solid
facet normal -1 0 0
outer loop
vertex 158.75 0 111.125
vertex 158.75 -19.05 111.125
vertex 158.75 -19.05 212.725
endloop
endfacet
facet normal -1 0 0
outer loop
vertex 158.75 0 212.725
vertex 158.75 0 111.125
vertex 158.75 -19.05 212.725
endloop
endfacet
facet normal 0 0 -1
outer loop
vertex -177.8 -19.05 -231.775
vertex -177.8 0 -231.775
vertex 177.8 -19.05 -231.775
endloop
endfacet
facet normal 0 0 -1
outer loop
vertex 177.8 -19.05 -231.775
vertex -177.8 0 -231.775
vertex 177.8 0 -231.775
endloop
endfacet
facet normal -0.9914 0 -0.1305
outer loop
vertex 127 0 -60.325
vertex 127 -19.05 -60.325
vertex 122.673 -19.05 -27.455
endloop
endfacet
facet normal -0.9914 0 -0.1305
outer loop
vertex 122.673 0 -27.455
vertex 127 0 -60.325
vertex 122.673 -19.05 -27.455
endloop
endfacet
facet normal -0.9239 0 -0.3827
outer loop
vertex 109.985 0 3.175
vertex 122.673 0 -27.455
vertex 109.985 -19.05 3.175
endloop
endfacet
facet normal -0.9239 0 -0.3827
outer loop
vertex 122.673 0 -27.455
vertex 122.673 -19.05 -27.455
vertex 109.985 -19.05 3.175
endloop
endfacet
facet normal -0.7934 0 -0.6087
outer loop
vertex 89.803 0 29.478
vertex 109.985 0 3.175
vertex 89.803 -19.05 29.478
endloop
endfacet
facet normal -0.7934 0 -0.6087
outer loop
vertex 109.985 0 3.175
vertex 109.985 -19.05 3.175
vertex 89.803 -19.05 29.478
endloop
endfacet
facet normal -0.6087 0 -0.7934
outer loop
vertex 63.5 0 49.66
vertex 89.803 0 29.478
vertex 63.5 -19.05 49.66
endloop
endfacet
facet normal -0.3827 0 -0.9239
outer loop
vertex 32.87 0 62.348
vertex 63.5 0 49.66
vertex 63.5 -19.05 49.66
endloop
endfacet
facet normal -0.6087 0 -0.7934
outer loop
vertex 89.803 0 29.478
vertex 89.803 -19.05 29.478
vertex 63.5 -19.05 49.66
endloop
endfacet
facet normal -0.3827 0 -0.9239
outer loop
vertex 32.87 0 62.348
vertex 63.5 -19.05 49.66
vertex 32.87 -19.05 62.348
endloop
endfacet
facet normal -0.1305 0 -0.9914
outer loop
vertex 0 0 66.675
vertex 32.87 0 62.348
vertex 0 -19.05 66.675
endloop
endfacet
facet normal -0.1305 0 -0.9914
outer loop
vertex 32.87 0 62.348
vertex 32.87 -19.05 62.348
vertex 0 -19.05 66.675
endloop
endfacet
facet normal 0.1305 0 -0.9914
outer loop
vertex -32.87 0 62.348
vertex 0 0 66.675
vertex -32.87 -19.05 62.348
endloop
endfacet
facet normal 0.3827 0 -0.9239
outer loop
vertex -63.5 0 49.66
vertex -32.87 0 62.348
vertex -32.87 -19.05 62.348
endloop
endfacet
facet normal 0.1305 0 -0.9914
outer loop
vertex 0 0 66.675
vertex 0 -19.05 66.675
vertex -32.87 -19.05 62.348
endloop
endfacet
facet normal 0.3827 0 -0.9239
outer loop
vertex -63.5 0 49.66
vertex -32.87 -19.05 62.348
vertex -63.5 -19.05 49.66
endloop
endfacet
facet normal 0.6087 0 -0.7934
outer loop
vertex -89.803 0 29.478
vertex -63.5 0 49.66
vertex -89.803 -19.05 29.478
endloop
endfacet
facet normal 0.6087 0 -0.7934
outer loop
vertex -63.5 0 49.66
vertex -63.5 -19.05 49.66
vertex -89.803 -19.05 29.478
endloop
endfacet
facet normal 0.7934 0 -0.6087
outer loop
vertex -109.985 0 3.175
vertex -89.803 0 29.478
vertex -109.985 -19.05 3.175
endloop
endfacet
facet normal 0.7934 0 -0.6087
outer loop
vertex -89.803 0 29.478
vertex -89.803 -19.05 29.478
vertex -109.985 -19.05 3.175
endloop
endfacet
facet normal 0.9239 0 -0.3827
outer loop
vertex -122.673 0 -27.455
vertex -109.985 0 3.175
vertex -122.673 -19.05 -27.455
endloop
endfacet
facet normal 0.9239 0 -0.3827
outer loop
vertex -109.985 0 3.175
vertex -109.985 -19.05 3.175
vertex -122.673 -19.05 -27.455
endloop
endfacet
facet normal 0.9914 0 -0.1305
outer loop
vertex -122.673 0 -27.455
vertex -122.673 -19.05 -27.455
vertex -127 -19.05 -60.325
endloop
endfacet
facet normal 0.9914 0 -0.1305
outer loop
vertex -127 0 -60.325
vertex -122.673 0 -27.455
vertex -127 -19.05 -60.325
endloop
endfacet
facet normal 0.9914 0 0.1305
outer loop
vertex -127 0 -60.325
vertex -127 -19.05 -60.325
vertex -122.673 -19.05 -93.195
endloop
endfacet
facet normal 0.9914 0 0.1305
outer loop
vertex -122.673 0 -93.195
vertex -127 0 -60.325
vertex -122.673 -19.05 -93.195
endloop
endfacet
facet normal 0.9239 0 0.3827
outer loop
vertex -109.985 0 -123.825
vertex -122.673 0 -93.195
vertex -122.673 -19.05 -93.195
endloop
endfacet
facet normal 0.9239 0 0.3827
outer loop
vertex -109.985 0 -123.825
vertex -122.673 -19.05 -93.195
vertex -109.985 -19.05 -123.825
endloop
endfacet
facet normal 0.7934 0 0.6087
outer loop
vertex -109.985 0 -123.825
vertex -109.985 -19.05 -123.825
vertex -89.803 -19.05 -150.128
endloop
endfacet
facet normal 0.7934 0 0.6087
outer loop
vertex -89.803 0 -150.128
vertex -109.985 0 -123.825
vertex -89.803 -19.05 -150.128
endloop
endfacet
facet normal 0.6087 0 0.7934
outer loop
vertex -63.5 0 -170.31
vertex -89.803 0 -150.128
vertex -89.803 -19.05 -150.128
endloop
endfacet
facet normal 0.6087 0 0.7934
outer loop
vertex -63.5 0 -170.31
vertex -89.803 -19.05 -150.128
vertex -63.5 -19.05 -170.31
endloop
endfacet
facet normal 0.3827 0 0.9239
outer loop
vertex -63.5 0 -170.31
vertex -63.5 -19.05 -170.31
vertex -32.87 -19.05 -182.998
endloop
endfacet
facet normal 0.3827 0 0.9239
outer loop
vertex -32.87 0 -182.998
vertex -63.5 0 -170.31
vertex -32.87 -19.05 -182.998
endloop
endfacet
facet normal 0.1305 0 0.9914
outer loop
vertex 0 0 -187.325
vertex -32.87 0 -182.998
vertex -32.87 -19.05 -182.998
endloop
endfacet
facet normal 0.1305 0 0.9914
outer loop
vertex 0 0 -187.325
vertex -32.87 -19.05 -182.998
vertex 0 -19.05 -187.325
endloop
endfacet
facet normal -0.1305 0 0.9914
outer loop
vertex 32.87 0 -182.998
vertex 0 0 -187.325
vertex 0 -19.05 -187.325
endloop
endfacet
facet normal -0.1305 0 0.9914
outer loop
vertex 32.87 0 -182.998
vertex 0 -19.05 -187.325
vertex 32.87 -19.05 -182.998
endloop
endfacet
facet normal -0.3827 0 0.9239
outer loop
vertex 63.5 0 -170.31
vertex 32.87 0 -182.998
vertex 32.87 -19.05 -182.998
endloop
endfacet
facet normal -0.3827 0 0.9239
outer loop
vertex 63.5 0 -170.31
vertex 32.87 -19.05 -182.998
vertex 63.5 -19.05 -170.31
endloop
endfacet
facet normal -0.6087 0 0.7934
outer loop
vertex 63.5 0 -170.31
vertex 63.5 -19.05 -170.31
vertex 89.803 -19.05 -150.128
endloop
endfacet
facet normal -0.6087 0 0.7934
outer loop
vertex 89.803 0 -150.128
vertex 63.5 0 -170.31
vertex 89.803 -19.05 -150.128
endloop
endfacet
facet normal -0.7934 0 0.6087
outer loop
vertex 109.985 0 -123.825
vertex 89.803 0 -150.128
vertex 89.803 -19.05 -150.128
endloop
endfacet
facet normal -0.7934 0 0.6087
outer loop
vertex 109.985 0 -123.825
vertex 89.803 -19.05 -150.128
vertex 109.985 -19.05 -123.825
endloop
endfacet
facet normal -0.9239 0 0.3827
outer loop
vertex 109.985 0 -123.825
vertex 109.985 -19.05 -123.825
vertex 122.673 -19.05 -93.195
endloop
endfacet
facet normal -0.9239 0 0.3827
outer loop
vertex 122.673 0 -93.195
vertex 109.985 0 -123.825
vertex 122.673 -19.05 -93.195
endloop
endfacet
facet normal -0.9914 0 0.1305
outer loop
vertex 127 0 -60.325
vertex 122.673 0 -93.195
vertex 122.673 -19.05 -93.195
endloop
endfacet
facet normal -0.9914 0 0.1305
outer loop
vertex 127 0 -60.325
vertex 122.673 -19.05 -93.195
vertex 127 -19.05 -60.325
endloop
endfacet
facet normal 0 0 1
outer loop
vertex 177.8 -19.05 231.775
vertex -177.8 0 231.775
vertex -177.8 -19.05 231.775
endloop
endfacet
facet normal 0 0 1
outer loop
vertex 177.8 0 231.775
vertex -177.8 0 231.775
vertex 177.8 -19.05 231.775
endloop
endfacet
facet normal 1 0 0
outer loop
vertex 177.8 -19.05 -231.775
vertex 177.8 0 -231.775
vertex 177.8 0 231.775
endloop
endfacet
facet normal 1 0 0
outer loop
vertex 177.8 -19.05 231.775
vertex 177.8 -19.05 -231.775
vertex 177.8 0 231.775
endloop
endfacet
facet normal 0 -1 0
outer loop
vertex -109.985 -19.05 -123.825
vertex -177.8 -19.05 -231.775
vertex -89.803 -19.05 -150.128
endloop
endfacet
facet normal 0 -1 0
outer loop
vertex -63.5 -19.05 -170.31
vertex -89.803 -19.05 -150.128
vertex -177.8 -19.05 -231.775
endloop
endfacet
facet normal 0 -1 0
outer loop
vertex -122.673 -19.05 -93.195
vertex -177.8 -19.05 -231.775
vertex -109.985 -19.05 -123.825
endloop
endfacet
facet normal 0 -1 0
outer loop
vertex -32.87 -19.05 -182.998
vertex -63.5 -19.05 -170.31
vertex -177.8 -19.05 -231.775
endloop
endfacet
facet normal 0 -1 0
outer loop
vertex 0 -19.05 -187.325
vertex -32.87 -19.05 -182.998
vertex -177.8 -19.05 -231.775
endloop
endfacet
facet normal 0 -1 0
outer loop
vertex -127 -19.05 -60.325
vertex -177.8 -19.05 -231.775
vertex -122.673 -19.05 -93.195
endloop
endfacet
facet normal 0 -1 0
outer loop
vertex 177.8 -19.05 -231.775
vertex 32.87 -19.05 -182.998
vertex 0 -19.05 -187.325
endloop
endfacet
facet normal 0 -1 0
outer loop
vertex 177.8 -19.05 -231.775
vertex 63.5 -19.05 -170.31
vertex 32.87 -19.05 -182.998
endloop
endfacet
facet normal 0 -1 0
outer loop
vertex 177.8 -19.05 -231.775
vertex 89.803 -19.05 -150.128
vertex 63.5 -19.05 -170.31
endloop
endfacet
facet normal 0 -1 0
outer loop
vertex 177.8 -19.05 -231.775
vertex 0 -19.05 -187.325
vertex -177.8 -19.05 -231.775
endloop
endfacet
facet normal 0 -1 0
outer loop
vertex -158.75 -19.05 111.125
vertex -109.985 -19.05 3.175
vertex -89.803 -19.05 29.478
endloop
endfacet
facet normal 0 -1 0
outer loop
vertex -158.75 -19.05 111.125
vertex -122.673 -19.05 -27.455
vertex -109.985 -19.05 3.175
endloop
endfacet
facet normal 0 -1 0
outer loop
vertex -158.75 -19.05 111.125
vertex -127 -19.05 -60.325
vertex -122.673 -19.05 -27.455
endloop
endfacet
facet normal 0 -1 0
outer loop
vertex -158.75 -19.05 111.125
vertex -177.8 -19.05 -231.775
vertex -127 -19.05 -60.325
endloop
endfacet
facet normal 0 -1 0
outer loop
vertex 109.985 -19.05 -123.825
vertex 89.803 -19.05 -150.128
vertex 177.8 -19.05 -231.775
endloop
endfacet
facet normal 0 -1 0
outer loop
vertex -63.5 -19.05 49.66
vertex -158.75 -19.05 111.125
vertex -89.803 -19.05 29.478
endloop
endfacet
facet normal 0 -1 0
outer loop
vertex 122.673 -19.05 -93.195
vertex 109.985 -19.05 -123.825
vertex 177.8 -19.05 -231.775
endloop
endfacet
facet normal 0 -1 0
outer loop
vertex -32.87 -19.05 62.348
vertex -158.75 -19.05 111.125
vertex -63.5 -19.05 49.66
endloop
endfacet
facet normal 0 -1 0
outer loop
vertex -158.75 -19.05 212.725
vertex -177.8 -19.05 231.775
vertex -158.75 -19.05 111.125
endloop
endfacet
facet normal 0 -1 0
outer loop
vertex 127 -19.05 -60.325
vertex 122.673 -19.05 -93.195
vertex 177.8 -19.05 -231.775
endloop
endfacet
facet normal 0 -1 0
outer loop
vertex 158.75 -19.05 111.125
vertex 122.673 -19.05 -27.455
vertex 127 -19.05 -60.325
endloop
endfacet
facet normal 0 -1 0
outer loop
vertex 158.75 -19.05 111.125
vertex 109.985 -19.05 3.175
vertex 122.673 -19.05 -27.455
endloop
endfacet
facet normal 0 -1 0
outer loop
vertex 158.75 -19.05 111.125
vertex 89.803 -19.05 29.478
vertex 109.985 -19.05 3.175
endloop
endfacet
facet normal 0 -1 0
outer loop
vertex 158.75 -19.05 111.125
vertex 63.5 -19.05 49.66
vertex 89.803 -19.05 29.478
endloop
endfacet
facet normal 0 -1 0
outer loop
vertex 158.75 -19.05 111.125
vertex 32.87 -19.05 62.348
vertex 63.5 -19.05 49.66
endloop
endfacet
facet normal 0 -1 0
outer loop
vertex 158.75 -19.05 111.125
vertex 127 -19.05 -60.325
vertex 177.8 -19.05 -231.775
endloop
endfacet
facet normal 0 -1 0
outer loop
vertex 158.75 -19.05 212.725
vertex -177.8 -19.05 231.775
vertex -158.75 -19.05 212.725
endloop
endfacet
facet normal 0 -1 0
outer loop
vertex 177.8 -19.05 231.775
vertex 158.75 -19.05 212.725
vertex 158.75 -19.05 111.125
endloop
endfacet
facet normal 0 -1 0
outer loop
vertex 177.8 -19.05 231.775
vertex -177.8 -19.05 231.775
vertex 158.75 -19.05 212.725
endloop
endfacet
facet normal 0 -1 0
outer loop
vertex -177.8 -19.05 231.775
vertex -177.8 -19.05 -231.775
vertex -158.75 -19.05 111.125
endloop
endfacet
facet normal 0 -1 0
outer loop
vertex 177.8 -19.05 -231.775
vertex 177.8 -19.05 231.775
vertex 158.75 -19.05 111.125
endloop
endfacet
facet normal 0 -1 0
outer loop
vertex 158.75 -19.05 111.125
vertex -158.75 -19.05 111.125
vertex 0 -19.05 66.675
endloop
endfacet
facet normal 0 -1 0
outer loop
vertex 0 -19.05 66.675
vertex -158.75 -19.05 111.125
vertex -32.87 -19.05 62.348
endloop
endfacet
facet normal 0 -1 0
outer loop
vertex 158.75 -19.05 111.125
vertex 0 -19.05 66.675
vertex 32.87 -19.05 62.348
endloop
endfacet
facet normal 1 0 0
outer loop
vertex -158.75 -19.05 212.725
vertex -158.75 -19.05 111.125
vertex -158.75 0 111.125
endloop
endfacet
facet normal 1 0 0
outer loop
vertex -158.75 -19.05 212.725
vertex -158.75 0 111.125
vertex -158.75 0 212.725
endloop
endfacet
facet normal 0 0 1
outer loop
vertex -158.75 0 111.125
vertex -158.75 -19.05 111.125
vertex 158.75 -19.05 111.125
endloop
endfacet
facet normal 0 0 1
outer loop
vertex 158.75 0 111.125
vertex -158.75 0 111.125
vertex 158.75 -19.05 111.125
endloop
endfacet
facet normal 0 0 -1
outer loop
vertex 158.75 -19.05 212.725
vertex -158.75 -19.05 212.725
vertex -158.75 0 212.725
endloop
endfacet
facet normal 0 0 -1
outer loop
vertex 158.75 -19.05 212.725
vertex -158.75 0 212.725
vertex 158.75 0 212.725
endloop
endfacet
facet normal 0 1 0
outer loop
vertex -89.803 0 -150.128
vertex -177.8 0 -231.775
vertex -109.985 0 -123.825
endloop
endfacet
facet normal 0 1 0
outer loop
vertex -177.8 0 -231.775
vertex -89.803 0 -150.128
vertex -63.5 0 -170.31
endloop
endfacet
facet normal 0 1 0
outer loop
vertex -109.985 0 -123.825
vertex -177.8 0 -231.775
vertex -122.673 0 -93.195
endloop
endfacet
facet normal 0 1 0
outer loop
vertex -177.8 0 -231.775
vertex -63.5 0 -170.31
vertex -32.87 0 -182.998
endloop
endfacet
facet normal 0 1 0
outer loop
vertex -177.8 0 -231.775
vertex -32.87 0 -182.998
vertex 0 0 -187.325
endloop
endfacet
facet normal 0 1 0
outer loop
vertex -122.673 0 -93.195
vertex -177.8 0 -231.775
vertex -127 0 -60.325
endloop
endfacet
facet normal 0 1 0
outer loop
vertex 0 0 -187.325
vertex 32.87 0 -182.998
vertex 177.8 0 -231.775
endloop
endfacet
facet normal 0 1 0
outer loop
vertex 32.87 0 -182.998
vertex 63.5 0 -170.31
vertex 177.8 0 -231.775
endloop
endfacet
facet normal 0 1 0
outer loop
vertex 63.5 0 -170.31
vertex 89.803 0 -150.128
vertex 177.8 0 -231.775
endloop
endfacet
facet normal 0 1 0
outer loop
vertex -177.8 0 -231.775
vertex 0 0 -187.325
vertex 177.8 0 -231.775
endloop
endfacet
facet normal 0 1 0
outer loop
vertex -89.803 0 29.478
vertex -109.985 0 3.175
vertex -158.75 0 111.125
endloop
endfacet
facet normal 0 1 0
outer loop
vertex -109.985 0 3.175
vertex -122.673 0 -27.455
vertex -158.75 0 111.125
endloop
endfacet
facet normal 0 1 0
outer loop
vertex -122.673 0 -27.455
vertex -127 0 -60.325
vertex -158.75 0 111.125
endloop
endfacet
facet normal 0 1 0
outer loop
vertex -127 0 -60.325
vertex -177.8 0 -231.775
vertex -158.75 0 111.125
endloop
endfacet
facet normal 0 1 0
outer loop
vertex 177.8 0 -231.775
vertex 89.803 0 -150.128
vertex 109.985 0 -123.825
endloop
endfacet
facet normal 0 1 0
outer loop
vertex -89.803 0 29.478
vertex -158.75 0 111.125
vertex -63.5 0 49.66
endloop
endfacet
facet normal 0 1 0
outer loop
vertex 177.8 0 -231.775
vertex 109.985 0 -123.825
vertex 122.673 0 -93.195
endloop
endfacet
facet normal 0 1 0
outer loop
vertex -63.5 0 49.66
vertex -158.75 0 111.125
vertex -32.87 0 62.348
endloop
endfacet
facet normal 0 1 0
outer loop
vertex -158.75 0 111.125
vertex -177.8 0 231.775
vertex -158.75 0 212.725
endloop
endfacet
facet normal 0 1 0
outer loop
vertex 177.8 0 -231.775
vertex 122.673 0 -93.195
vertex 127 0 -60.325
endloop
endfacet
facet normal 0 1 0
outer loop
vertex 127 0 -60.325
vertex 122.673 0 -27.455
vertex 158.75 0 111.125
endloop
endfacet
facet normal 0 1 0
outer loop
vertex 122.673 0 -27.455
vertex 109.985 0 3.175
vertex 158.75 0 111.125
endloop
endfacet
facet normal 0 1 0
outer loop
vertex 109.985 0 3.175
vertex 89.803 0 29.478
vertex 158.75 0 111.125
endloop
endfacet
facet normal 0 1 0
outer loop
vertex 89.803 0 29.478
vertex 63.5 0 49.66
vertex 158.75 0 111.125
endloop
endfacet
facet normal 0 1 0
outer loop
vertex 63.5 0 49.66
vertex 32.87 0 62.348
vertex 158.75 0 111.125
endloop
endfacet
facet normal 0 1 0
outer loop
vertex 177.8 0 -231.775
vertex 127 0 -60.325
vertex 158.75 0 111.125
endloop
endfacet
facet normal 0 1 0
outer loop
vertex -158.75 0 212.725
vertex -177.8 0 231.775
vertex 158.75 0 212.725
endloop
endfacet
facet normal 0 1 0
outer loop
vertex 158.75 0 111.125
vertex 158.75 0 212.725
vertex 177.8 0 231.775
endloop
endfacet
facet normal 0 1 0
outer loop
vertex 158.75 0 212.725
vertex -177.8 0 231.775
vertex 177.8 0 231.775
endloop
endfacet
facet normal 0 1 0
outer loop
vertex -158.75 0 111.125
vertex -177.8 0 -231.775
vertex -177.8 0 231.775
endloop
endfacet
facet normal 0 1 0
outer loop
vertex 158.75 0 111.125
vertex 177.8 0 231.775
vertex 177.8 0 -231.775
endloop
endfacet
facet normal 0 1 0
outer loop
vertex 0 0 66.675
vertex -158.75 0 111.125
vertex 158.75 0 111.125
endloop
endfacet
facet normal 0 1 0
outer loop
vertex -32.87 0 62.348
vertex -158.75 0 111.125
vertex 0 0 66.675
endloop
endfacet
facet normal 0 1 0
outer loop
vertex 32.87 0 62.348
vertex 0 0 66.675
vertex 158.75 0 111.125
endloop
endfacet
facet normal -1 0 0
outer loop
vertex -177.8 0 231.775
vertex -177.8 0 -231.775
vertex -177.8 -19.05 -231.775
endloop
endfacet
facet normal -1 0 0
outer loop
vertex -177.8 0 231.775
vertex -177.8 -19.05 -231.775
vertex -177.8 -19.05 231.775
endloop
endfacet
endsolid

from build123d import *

# Parameters (mm, degrees)
F0_W     = 355.6
F0_H     = 463.55
F1_DEPTH = 19.05
F2_W     = 317.5
F2_H     = 101.6
F3_DEPTH = 19.051
F4_R     = 127
F5_DEPTH = 19.051


with BuildPart() as f1:
    # F0 (on Front) → F1 (new body)
    with BuildSketch(Plane.XZ):
        Rectangle(F0_W, F0_H)
    extrude(amount=F1_DEPTH)

    # F2 (on face) → F3 (cut, through all)
    with BuildSketch(Plane.XZ.offset(19.05)):
        with Locations((0, 161.925)):
            Rectangle(F2_W, F2_H)
    extrude(amount=-F3_DEPTH, mode=Mode.SUBTRACT)

    # F4 (on face) → F5 (cut, through all)
    with BuildSketch(Plane.XZ.offset(19.05)):
        with Locations((0, -60.325)):
            Circle(F4_R)
    extrude(amount=-F5_DEPTH, mode=Mode.SUBTRACT)


solid = f1.part
